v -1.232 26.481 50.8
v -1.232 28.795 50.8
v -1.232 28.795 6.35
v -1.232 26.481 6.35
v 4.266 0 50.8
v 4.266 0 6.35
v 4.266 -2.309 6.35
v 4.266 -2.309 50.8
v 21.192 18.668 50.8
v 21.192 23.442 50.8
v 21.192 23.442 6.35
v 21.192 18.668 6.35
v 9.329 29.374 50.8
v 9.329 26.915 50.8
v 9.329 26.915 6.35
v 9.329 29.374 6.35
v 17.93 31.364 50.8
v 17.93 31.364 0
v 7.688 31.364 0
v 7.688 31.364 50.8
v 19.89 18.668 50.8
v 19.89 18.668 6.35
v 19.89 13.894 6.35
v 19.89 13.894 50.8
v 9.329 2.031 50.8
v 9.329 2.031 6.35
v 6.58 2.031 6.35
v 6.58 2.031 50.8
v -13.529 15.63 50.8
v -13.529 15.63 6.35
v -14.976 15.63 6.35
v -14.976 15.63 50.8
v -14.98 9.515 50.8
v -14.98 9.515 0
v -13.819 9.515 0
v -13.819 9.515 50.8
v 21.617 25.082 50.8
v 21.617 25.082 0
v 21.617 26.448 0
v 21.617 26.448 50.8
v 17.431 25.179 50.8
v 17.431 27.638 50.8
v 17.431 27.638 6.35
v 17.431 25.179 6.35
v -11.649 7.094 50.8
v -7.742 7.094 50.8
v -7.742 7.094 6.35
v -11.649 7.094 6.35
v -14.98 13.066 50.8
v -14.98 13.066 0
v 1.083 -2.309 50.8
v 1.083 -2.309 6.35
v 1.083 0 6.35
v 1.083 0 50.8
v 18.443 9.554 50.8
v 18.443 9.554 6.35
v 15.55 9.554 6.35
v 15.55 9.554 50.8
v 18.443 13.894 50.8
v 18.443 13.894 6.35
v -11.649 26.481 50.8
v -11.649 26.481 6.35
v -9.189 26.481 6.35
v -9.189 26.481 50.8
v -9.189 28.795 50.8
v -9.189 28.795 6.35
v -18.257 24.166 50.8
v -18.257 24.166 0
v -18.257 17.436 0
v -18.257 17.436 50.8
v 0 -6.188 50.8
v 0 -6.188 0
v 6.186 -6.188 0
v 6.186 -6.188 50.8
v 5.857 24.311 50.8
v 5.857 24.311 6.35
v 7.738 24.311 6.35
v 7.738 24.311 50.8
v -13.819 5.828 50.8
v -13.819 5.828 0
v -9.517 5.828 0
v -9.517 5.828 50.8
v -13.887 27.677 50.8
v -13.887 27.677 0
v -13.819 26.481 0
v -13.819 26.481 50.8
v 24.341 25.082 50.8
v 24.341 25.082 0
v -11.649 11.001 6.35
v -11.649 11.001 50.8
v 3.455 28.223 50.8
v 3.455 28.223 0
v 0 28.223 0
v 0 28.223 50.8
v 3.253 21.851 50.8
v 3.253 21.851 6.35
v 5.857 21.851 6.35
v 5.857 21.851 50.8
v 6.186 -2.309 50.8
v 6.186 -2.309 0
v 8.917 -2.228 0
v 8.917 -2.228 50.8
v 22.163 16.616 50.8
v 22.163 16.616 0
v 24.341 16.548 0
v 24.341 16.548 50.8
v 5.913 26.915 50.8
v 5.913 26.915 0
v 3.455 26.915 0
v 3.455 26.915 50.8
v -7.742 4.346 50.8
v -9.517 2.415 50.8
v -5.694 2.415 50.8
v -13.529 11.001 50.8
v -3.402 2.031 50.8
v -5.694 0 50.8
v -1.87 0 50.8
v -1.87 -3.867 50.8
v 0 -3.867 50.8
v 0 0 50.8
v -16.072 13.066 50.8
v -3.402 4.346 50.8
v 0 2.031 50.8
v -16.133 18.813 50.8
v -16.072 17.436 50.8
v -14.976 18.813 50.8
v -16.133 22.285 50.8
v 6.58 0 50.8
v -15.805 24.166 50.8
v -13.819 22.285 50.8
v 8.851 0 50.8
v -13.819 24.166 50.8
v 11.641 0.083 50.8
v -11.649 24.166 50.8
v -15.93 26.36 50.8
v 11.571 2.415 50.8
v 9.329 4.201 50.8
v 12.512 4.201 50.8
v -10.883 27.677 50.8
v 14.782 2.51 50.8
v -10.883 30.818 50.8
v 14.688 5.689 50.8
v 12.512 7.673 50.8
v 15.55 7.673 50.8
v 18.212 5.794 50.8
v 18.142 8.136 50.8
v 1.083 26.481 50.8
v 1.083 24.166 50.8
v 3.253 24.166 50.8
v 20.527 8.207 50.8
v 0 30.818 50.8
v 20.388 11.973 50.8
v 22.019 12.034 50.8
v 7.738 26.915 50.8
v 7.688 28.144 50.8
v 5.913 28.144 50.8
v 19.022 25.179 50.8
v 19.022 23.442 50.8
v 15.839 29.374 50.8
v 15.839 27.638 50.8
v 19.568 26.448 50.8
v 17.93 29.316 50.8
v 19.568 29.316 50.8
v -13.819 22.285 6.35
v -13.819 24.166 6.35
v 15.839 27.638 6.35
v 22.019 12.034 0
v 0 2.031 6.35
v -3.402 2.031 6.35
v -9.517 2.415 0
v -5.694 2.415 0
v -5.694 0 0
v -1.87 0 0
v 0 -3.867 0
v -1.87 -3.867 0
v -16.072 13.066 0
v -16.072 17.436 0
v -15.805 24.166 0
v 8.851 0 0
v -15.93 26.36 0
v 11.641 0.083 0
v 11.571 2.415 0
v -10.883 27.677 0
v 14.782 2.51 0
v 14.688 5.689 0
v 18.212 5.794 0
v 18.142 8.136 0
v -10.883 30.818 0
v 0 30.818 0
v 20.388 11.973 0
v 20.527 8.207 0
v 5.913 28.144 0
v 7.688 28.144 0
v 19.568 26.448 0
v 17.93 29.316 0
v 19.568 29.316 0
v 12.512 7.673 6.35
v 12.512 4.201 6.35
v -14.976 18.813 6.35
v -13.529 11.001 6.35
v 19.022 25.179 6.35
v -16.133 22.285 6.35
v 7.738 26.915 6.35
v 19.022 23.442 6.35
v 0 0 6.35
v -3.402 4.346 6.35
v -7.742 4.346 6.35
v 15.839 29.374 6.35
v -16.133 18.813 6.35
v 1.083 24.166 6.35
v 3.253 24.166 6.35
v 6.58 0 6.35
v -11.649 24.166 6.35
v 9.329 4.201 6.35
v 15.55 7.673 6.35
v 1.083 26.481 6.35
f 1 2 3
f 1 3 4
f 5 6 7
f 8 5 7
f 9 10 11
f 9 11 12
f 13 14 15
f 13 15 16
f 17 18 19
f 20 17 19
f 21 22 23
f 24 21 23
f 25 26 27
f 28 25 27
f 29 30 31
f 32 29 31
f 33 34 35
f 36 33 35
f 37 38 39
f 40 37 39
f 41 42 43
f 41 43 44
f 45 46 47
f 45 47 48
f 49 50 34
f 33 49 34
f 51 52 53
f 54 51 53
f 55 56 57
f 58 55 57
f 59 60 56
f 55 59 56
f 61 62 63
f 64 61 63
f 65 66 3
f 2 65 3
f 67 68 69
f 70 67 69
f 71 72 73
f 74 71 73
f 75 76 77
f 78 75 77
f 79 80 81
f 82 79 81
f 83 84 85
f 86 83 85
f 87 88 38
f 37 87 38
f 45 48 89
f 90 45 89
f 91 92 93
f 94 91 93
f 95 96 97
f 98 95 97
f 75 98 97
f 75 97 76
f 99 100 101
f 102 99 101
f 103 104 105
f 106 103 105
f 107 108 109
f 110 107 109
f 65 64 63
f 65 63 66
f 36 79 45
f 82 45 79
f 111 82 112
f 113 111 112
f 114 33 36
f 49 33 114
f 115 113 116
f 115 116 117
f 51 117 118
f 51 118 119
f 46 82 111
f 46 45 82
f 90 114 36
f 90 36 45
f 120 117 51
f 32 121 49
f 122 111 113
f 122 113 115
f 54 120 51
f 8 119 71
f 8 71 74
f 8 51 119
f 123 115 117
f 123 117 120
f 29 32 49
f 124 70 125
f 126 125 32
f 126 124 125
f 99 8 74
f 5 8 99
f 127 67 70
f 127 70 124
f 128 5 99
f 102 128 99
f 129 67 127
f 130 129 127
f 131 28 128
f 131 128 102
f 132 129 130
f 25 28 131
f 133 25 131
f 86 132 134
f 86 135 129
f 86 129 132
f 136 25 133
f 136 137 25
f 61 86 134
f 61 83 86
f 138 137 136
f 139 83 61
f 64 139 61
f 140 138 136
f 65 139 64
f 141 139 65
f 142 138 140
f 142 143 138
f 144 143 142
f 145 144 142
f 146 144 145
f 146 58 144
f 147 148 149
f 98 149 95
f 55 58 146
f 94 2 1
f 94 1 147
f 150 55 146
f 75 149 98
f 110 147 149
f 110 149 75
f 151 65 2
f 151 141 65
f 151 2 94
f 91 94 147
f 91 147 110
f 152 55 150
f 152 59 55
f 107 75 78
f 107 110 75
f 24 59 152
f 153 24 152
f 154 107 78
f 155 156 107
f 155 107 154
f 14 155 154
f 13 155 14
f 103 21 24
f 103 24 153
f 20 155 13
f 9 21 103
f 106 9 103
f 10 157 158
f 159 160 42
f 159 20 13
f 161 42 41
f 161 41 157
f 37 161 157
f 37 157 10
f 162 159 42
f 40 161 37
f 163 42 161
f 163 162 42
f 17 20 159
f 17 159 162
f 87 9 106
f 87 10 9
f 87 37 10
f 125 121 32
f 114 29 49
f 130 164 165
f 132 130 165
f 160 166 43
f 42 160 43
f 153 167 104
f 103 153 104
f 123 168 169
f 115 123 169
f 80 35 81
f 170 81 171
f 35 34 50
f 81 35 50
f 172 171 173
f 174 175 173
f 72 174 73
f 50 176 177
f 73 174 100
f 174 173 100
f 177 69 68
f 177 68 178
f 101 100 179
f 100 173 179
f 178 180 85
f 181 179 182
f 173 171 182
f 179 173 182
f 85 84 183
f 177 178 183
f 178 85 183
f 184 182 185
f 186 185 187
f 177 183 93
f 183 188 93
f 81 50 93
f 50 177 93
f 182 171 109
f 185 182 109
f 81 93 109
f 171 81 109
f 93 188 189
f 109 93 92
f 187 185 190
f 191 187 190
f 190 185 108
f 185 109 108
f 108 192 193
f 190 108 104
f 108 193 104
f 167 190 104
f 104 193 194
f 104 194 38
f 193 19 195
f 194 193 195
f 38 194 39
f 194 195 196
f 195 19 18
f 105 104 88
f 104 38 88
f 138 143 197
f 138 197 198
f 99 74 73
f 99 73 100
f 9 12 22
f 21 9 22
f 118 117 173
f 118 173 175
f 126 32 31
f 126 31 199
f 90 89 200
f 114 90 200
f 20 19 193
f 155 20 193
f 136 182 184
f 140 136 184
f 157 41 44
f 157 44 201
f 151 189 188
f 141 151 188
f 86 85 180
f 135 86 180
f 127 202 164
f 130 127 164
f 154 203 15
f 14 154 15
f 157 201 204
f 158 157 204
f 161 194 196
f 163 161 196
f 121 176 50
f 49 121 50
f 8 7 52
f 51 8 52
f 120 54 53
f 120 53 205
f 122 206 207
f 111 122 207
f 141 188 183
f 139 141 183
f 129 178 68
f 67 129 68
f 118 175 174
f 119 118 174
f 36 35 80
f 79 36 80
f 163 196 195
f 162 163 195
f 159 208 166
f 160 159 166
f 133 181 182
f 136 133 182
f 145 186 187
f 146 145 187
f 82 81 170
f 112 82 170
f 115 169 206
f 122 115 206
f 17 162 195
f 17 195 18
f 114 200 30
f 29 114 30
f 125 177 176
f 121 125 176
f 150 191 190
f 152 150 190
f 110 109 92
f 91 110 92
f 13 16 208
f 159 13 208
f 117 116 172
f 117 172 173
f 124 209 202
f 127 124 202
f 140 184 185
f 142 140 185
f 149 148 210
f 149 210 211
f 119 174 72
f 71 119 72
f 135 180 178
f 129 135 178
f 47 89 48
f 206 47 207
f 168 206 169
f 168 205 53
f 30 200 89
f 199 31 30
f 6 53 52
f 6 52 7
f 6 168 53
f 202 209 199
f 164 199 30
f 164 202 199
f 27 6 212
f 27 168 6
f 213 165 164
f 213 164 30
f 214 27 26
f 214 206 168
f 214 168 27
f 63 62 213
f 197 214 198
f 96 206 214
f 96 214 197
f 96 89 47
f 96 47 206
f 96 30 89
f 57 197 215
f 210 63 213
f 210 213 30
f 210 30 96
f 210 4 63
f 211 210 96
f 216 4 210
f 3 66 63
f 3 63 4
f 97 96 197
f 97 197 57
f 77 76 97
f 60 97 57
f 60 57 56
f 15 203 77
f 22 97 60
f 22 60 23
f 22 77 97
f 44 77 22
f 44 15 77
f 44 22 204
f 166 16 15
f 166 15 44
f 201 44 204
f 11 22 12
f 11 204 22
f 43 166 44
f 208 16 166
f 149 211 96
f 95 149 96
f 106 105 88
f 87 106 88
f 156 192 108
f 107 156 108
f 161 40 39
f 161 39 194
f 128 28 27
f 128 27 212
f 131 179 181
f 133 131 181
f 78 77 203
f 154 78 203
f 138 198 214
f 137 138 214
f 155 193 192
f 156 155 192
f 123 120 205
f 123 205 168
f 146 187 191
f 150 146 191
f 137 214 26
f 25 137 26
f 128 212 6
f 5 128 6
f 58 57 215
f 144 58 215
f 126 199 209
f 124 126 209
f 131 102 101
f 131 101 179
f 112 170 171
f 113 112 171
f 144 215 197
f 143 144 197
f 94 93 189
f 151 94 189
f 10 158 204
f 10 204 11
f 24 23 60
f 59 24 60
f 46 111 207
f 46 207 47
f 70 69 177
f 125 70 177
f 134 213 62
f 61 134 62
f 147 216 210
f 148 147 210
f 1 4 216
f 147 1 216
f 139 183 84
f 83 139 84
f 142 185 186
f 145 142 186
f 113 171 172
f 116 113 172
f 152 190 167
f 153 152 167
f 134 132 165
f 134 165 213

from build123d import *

# Parameters (mm, degrees)
F1_DEPTH = 6.35
F2_DEPTH = 50.8


with BuildPart() as f1:
    # F0 (on Top) → F1 (new body)
    with BuildSketch(Plane.XY):
        Polygon((3.252794, 21.851061), (3.252794, 22.285081), (3.252794, 24.165833), (1.082697, 24.165833), (1.082697, 26.480602), (-1.232074, 26.480602), (-1.232074, 28.795373), (-3.402171, 28.795373), (-6.440307, 28.795373), (-9.189097, 28.795373), (-9.189097, 26.480602), (-11.64854, 26.480602), (-11.64854, 24.165833), (-13.818637, 24.165833), (-13.818637, 22.285081), (-16.133409, 22.285081), (-16.133409, 18.812926), (-14.976023, 18.812926), (-14.976023, 15.630117), (-13.529291, 15.630117), (-13.529291, 11.000575), (-11.64854, 11.000575), (-11.64854, 7.0944), (-7.742365, 7.0944), (-7.742365, 4.345611), (-3.402171, 4.345611), (-3.402171, 2.03084), (0, 2.03084), (0, 0), (1.082697, 0), (1.082697, -2.309354), (4.265506, -2.309354), (4.265506, 0), (6.580276, 0), (6.580276, 2.03084), (9.329067, 2.03084), (9.329067, 4.200937), (12.511875, 4.200937), (12.511875, 7.673093), (15.550012, 7.673093), (15.550012, 9.553844), (18.443475, 9.553844), (18.443475, 13.894038), (19.890206, 13.894038), (19.890206, 18.668253), (21.192264, 18.668253), (21.192264, 23.442466), (19.022167, 23.442466), (19.022167, 25.178544), (17.430764, 25.178544), (17.430764, 27.637988), (15.839359, 27.637988), (15.839359, 29.374065), (9.329067, 29.374065), (9.329067, 26.914621), (7.737662, 26.914621), (7.737662, 24.310505), (5.856911, 24.310505), (5.856911, 21.851061), align=None)
    extrude(amount=F1_DEPTH)

    # F0 (on Top) → F2 (join)
    with BuildSketch(Plane.XY):
        Polygon((0, 28.223222), (0, 30.817736), (-10.882908, 30.817736), (-10.882908, 27.677011), (-13.887079, 27.677011), (-13.818637, 26.480602), (-15.930331, 26.359802), (-15.804824, 24.165833), (-18.256783, 24.165833), (-18.256783, 17.435515), (-16.071932, 17.435515), (-16.071932, 13.06581), (-14.979505, 13.06581), (-14.979505, 9.515426), (-13.818637, 9.515426), (-13.818637, 5.828488), (-9.517374, 5.828488), (-9.517374, 2.414656), (-5.693883, 2.414656), (-5.693883, 0), (-1.870391, 0), (-1.870391, -3.866795), (0, -3.866795), (0, -6.188201), (6.186252, -6.188201), (6.186252, -2.309354), (8.917317, -2.228155), (8.85107, 0), (11.64057, 0.082936), (11.571244, 2.414656), (14.78221, 2.510123), (14.687699, 5.688919), (18.212094, 5.793705), (18.142457, 8.135915), (20.526713, 8.206803), (20.387793, 11.973385), (22.019175, 12.033554), (22.162985, 16.616195), (24.341406, 16.547833), (24.341406, 25.082497), (21.616772, 25.082497), (21.616772, 26.448032), (19.568473, 26.448032), (19.568473, 29.31565), (17.929833, 29.31565), (17.929833, 31.363949), (7.688338, 31.363949), (7.688338, 28.144343), (5.913145, 28.144343), (5.913145, 26.914621), (3.455187, 26.914621), (3.455187, 28.223222), align=None)
        Polygon((3.252794, 24.165833), (3.252794, 22.285081), (3.252794, 21.851061), (5.856911, 21.851061), (5.856911, 24.310505), (7.737662, 24.310505), (7.737662, 26.914621), (9.329067, 26.914621), (9.329067, 29.374065), (15.839359, 29.374065), (15.839359, 27.637988), (17.430764, 27.637988), (17.430764, 25.178544), (19.022167, 25.178544), (19.022167, 23.442466), (21.192264, 23.442466), (21.192264, 18.668253), (19.890206, 18.668253), (19.890206, 13.894038), (18.443475, 13.894038), (18.443475, 9.553844), (15.550012, 9.553844), (15.550012, 7.673093), (12.511875, 7.673093), (12.511875, 4.200937), (9.329067, 4.200937), (9.329067, 2.03084), (6.580276, 2.03084), (6.580276, 0), (4.265506, 0), (4.265506, -2.309354), (1.082697, -2.309354), (1.082697, 0), (0, 0), (0, 2.03084), (-3.402171, 2.03084), (-3.402171, 4.345611), (-7.742365, 4.345611), (-7.742365, 7.0944), (-11.64854, 7.0944), (-11.64854, 11.000575), (-13.529291, 11.000575), (-13.529291, 15.630117), (-14.976023, 15.630117), (-14.976023, 18.812926), (-16.133409, 18.812926), (-16.133409, 22.285081), (-13.818637, 22.285081), (-13.818637, 24.165833), (-11.64854, 24.165833), (-11.64854, 26.480602), (-9.189097, 26.480602), (-9.189097, 28.795373), (-6.440307, 28.795373), (-3.402171, 28.795373), (-1.232074, 28.795373), (-1.232074, 26.480602), (1.082697, 26.480602), (1.082697, 24.165833), align=None, mode=Mode.SUBTRACT)
    extrude(amount=F2_DEPTH)


solid = f1.part
